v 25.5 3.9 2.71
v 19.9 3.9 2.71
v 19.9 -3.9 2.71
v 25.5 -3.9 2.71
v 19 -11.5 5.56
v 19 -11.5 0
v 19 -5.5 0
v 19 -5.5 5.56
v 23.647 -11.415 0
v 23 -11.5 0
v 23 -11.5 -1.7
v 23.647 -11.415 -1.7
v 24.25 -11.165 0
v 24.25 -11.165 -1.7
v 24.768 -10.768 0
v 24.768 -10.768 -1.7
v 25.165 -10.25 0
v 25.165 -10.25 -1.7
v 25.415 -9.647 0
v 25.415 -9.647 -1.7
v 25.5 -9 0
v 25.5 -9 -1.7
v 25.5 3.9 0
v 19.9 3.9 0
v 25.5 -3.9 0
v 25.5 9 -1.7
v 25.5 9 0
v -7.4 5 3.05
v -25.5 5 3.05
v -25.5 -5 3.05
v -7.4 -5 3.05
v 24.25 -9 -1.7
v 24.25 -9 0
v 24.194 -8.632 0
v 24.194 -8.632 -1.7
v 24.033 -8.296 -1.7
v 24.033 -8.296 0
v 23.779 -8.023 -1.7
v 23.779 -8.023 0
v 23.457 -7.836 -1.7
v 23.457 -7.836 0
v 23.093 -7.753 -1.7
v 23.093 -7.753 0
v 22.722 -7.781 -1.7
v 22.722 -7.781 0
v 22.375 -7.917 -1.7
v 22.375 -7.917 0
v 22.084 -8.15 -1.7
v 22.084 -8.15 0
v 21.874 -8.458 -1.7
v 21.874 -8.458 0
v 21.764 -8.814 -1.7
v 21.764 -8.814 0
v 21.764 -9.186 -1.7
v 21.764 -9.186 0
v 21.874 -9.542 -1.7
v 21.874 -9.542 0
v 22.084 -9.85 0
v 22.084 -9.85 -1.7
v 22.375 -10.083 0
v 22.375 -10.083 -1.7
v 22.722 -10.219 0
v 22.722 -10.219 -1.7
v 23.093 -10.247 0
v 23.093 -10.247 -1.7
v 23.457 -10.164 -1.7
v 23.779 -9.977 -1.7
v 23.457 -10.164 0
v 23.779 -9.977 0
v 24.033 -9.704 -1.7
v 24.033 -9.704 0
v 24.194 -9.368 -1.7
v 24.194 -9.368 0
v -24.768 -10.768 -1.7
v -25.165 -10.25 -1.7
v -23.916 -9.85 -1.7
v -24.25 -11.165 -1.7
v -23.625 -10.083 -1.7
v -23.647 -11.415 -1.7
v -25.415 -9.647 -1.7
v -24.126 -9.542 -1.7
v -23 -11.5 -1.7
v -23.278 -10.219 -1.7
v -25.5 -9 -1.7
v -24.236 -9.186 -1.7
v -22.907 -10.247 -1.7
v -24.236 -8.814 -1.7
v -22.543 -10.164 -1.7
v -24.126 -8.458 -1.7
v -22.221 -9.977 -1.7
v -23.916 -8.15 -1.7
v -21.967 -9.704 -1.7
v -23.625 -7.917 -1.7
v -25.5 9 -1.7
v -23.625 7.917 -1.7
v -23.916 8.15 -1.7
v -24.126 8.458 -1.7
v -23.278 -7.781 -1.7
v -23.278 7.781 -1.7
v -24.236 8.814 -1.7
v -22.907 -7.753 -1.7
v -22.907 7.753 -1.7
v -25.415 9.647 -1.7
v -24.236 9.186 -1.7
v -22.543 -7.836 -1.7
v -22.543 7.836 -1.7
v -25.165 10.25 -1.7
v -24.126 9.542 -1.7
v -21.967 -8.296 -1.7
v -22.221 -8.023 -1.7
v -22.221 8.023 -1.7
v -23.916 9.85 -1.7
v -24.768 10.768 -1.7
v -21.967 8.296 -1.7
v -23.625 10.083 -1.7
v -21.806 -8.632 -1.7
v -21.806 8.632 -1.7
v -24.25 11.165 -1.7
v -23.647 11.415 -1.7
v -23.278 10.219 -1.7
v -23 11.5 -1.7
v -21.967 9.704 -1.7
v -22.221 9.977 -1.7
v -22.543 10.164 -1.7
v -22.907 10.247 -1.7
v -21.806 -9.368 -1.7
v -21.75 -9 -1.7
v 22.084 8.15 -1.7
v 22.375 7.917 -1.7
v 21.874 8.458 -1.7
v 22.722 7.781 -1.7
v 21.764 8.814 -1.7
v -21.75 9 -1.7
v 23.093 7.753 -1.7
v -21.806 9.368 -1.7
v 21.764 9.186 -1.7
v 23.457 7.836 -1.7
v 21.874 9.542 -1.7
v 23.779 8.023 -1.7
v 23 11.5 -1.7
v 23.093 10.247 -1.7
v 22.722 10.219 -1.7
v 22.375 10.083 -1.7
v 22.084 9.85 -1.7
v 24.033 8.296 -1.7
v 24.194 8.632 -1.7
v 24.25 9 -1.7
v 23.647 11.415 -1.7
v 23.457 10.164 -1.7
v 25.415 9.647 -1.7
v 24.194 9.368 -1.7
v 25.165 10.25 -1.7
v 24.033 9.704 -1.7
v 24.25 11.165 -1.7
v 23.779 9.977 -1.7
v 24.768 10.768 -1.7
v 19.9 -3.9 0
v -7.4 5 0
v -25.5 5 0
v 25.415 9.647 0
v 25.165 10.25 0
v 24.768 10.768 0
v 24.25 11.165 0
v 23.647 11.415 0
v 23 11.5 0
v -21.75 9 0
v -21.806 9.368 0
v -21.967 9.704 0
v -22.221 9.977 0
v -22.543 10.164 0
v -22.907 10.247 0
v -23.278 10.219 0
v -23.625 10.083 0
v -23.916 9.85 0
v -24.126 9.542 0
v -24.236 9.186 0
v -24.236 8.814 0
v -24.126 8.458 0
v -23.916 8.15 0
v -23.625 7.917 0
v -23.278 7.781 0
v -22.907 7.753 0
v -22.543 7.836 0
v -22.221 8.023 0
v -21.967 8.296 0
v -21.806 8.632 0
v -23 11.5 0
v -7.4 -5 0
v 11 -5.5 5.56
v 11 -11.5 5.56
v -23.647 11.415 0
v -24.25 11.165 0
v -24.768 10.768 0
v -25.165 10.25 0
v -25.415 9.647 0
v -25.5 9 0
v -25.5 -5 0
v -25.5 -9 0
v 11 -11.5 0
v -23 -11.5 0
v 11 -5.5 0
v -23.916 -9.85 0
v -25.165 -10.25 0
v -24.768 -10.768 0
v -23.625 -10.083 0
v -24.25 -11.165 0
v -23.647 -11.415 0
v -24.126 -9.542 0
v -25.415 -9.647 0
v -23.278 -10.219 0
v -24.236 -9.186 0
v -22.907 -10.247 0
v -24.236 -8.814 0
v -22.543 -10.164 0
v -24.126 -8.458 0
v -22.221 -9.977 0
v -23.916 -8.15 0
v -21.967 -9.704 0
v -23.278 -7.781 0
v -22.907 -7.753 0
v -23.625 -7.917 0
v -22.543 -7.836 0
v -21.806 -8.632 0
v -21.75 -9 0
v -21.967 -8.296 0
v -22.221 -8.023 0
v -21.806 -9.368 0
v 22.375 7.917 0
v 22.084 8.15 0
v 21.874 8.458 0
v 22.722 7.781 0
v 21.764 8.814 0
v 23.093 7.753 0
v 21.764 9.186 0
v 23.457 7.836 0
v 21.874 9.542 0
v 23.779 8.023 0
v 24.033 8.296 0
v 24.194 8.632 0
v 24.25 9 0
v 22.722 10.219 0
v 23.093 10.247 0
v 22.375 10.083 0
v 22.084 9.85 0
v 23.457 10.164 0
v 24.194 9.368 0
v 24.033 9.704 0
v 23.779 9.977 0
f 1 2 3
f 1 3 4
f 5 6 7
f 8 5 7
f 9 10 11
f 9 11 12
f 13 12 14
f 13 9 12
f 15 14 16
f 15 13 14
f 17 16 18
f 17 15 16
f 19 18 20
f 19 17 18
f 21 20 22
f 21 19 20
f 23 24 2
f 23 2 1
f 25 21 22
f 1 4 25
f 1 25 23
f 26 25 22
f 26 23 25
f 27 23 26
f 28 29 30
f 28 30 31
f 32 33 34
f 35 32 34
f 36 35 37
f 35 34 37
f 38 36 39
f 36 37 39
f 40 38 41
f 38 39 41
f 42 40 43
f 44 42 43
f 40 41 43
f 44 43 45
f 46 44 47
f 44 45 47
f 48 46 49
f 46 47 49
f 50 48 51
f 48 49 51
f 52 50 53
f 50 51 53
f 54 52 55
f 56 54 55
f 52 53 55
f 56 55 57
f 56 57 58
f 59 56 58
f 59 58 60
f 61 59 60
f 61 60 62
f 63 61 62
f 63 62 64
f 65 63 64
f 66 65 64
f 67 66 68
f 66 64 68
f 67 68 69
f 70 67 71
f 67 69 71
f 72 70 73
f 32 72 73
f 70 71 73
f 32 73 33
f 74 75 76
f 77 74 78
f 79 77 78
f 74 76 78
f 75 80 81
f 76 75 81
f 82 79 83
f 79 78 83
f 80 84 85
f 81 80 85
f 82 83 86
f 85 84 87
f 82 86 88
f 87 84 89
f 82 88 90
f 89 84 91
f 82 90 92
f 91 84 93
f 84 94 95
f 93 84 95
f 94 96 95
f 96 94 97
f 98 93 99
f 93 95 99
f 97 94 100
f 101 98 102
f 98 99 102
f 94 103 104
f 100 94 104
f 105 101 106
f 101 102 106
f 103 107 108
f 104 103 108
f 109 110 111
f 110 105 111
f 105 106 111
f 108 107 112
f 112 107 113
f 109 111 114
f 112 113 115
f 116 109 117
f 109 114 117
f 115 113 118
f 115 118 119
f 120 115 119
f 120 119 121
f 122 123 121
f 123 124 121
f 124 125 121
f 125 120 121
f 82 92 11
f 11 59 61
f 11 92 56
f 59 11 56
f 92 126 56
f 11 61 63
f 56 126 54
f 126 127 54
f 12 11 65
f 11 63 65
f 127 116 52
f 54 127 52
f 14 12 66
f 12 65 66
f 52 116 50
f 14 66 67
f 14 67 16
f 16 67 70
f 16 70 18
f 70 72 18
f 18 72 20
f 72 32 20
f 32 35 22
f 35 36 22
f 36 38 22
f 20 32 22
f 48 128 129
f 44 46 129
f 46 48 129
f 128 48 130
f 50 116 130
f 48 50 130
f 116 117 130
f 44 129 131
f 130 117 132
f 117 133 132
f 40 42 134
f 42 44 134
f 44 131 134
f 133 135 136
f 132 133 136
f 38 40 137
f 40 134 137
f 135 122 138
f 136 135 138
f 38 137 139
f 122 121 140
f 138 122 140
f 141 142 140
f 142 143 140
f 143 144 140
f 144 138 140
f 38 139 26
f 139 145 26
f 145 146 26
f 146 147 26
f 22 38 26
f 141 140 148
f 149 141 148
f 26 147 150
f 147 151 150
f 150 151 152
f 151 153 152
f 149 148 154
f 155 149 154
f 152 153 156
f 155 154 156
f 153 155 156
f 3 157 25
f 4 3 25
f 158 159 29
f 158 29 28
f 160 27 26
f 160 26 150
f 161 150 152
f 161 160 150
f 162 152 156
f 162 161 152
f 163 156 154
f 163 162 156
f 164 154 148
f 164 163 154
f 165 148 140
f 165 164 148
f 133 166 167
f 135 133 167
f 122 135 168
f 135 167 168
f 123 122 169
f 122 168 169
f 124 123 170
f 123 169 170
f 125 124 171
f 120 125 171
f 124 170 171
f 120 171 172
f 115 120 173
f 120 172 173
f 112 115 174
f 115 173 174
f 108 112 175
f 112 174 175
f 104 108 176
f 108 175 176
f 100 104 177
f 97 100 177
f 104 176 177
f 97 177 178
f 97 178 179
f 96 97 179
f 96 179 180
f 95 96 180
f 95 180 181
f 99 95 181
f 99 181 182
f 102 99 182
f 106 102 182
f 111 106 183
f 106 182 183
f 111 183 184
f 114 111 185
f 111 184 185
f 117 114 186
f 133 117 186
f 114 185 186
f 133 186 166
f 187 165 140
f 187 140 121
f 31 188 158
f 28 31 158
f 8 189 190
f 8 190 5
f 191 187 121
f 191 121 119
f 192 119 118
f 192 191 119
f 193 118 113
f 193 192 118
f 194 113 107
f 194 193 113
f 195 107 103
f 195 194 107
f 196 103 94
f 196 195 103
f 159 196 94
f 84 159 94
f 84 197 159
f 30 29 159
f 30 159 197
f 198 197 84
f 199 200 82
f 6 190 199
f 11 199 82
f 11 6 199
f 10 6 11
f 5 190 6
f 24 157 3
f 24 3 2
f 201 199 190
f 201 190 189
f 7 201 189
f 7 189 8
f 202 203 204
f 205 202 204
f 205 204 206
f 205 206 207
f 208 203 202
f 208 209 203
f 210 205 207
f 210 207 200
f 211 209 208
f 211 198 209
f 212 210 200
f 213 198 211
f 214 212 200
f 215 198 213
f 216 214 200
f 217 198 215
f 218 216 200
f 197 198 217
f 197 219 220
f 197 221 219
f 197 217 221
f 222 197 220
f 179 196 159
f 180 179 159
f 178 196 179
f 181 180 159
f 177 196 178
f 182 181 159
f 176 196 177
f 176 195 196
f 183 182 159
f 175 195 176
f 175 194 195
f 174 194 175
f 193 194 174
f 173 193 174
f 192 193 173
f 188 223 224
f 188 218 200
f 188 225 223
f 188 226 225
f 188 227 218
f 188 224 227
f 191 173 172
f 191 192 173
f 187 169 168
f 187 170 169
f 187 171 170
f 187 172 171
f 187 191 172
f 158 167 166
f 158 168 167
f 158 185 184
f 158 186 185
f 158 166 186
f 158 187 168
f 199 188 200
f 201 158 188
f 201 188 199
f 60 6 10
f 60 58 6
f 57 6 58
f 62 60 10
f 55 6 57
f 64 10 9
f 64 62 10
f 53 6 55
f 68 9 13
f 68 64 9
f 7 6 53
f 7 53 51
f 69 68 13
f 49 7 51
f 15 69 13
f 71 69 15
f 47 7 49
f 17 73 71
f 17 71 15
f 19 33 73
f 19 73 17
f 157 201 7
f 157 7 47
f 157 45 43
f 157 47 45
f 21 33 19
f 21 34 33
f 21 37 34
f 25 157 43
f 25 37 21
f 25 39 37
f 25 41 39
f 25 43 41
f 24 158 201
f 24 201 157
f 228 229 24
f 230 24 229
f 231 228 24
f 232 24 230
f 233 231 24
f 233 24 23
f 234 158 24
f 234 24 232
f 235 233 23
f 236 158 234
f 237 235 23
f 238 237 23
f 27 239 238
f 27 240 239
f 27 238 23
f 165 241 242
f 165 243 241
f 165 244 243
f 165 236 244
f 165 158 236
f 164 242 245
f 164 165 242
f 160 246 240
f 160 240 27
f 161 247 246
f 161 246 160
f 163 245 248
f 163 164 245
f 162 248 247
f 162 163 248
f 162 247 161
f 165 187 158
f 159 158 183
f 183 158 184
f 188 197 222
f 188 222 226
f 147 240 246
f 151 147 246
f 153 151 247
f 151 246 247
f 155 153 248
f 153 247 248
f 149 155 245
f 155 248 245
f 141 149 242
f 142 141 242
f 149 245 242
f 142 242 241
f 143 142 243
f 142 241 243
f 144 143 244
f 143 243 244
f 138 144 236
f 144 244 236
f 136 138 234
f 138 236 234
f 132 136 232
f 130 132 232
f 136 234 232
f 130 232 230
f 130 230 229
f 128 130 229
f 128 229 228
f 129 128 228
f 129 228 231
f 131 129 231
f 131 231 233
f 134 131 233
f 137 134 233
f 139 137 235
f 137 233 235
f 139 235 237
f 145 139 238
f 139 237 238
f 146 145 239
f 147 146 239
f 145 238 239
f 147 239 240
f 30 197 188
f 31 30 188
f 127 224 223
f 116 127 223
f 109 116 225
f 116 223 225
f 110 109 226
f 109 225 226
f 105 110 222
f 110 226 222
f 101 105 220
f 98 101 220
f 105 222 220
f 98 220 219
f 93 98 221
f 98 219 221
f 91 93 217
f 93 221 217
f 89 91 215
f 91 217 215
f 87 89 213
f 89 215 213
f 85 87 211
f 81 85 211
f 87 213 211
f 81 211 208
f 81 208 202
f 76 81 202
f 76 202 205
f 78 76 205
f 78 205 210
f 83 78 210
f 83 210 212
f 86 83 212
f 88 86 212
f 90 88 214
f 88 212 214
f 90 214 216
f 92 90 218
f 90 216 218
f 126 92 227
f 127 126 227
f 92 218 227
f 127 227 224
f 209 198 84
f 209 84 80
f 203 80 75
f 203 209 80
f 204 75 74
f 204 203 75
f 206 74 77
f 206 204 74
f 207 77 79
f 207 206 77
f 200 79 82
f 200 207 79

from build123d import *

# Parameters (mm, degrees)
F4_R     = 1.25
F4_W     = 18.1
F4_H     = 10
F4_W_2   = 8
F4_H_2   = 6
F4_W_3   = 5.6
F4_H_3   = 7.8
F5_DEPTH = 1.7
F6_DEPTH = 5.56
F7_DEPTH = 3.05
F8_DEPTH = 2.71


with BuildPart() as f5:
    # F4 (on Top) → F5 (new body)
    with BuildSketch(Plane.XY):
        with BuildLine():
            Line((23, 11.5), (-23, 11.5))
            ThreePointArc((-23, 11.5), (-24.767766953, 10.767766953), (-25.5, 9))
            Line((-25.5, 9), (-25.5, 5))
            Line((-25.5, 5), (-7.4, 5))
            Line((-7.4, 5), (-7.4, -5))
            Line((-7.4, -5), (-25.5, -5))
            Line((-25.5, -5), (-25.5, -9))
            ThreePointArc((-25.5, -9), (-24.767766953, -10.767766953), (-23, -11.5))
            Line((-23, -11.5), (11, -11.5))
            Line((11, -11.5), (11, -5.5))
            Line((11, -5.5), (19, -5.5))
            Line((19, -5.5), (19, -11.5))
            Line((19, -11.5), (23, -11.5))
            ThreePointArc((23, -11.5), (24.767766953, -10.767766953), (25.5, -9))
            Line((25.5, -9), (25.5, -3.9))
            Line((25.5, -3.9), (19.9, -3.9))
            Line((19.9, -3.9), (19.9, 3.9))
            Line((19.9, 3.9), (25.5, 3.9))
            Line((25.5, 3.9), (25.5, 9))
            ThreePointArc((25.5, 9), (24.767766953, 10.767766953), (23, 11.5))
        make_face()
        with Locations((-23, -9)):
            Circle(F4_R, mode=Mode.SUBTRACT)
        with Locations((23, -9)):
            Circle(F4_R, mode=Mode.SUBTRACT)
        with Locations((-23, 9)):
            Circle(F4_R, mode=Mode.SUBTRACT)
        with Locations((23, 9)):
            Circle(F4_R, mode=Mode.SUBTRACT)
        with Locations((-16.45, 0)):
            Rectangle(F4_W, F4_H)
        with Locations((15, -8.5)):
            Rectangle(F4_W_2, F4_H_2)
        with Locations((22.7, 0)):
            Rectangle(F4_W_3, F4_H_3)
    extrude(amount=-F5_DEPTH)

    # F4 (on Top) → F6 (join)
    with BuildSketch(Plane.XY):
        with Locations((15, -8.5)):
            Rectangle(F4_W_2, F4_H_2)
    extrude(amount=F6_DEPTH)

    # F4 (on Top) → F7 (join)
    with BuildSketch(Plane.XY):
        with Locations((-16.45, 0)):
            Rectangle(F4_W, F4_H)
    extrude(amount=F7_DEPTH)

    # F4 (on Top) → F8 (join)
    with BuildSketch(Plane.XY):
        with Locations((22.7, 0)):
            Rectangle(F4_W_3, F4_H_3)
    extrude(amount=F8_DEPTH)


solid = f5.part
